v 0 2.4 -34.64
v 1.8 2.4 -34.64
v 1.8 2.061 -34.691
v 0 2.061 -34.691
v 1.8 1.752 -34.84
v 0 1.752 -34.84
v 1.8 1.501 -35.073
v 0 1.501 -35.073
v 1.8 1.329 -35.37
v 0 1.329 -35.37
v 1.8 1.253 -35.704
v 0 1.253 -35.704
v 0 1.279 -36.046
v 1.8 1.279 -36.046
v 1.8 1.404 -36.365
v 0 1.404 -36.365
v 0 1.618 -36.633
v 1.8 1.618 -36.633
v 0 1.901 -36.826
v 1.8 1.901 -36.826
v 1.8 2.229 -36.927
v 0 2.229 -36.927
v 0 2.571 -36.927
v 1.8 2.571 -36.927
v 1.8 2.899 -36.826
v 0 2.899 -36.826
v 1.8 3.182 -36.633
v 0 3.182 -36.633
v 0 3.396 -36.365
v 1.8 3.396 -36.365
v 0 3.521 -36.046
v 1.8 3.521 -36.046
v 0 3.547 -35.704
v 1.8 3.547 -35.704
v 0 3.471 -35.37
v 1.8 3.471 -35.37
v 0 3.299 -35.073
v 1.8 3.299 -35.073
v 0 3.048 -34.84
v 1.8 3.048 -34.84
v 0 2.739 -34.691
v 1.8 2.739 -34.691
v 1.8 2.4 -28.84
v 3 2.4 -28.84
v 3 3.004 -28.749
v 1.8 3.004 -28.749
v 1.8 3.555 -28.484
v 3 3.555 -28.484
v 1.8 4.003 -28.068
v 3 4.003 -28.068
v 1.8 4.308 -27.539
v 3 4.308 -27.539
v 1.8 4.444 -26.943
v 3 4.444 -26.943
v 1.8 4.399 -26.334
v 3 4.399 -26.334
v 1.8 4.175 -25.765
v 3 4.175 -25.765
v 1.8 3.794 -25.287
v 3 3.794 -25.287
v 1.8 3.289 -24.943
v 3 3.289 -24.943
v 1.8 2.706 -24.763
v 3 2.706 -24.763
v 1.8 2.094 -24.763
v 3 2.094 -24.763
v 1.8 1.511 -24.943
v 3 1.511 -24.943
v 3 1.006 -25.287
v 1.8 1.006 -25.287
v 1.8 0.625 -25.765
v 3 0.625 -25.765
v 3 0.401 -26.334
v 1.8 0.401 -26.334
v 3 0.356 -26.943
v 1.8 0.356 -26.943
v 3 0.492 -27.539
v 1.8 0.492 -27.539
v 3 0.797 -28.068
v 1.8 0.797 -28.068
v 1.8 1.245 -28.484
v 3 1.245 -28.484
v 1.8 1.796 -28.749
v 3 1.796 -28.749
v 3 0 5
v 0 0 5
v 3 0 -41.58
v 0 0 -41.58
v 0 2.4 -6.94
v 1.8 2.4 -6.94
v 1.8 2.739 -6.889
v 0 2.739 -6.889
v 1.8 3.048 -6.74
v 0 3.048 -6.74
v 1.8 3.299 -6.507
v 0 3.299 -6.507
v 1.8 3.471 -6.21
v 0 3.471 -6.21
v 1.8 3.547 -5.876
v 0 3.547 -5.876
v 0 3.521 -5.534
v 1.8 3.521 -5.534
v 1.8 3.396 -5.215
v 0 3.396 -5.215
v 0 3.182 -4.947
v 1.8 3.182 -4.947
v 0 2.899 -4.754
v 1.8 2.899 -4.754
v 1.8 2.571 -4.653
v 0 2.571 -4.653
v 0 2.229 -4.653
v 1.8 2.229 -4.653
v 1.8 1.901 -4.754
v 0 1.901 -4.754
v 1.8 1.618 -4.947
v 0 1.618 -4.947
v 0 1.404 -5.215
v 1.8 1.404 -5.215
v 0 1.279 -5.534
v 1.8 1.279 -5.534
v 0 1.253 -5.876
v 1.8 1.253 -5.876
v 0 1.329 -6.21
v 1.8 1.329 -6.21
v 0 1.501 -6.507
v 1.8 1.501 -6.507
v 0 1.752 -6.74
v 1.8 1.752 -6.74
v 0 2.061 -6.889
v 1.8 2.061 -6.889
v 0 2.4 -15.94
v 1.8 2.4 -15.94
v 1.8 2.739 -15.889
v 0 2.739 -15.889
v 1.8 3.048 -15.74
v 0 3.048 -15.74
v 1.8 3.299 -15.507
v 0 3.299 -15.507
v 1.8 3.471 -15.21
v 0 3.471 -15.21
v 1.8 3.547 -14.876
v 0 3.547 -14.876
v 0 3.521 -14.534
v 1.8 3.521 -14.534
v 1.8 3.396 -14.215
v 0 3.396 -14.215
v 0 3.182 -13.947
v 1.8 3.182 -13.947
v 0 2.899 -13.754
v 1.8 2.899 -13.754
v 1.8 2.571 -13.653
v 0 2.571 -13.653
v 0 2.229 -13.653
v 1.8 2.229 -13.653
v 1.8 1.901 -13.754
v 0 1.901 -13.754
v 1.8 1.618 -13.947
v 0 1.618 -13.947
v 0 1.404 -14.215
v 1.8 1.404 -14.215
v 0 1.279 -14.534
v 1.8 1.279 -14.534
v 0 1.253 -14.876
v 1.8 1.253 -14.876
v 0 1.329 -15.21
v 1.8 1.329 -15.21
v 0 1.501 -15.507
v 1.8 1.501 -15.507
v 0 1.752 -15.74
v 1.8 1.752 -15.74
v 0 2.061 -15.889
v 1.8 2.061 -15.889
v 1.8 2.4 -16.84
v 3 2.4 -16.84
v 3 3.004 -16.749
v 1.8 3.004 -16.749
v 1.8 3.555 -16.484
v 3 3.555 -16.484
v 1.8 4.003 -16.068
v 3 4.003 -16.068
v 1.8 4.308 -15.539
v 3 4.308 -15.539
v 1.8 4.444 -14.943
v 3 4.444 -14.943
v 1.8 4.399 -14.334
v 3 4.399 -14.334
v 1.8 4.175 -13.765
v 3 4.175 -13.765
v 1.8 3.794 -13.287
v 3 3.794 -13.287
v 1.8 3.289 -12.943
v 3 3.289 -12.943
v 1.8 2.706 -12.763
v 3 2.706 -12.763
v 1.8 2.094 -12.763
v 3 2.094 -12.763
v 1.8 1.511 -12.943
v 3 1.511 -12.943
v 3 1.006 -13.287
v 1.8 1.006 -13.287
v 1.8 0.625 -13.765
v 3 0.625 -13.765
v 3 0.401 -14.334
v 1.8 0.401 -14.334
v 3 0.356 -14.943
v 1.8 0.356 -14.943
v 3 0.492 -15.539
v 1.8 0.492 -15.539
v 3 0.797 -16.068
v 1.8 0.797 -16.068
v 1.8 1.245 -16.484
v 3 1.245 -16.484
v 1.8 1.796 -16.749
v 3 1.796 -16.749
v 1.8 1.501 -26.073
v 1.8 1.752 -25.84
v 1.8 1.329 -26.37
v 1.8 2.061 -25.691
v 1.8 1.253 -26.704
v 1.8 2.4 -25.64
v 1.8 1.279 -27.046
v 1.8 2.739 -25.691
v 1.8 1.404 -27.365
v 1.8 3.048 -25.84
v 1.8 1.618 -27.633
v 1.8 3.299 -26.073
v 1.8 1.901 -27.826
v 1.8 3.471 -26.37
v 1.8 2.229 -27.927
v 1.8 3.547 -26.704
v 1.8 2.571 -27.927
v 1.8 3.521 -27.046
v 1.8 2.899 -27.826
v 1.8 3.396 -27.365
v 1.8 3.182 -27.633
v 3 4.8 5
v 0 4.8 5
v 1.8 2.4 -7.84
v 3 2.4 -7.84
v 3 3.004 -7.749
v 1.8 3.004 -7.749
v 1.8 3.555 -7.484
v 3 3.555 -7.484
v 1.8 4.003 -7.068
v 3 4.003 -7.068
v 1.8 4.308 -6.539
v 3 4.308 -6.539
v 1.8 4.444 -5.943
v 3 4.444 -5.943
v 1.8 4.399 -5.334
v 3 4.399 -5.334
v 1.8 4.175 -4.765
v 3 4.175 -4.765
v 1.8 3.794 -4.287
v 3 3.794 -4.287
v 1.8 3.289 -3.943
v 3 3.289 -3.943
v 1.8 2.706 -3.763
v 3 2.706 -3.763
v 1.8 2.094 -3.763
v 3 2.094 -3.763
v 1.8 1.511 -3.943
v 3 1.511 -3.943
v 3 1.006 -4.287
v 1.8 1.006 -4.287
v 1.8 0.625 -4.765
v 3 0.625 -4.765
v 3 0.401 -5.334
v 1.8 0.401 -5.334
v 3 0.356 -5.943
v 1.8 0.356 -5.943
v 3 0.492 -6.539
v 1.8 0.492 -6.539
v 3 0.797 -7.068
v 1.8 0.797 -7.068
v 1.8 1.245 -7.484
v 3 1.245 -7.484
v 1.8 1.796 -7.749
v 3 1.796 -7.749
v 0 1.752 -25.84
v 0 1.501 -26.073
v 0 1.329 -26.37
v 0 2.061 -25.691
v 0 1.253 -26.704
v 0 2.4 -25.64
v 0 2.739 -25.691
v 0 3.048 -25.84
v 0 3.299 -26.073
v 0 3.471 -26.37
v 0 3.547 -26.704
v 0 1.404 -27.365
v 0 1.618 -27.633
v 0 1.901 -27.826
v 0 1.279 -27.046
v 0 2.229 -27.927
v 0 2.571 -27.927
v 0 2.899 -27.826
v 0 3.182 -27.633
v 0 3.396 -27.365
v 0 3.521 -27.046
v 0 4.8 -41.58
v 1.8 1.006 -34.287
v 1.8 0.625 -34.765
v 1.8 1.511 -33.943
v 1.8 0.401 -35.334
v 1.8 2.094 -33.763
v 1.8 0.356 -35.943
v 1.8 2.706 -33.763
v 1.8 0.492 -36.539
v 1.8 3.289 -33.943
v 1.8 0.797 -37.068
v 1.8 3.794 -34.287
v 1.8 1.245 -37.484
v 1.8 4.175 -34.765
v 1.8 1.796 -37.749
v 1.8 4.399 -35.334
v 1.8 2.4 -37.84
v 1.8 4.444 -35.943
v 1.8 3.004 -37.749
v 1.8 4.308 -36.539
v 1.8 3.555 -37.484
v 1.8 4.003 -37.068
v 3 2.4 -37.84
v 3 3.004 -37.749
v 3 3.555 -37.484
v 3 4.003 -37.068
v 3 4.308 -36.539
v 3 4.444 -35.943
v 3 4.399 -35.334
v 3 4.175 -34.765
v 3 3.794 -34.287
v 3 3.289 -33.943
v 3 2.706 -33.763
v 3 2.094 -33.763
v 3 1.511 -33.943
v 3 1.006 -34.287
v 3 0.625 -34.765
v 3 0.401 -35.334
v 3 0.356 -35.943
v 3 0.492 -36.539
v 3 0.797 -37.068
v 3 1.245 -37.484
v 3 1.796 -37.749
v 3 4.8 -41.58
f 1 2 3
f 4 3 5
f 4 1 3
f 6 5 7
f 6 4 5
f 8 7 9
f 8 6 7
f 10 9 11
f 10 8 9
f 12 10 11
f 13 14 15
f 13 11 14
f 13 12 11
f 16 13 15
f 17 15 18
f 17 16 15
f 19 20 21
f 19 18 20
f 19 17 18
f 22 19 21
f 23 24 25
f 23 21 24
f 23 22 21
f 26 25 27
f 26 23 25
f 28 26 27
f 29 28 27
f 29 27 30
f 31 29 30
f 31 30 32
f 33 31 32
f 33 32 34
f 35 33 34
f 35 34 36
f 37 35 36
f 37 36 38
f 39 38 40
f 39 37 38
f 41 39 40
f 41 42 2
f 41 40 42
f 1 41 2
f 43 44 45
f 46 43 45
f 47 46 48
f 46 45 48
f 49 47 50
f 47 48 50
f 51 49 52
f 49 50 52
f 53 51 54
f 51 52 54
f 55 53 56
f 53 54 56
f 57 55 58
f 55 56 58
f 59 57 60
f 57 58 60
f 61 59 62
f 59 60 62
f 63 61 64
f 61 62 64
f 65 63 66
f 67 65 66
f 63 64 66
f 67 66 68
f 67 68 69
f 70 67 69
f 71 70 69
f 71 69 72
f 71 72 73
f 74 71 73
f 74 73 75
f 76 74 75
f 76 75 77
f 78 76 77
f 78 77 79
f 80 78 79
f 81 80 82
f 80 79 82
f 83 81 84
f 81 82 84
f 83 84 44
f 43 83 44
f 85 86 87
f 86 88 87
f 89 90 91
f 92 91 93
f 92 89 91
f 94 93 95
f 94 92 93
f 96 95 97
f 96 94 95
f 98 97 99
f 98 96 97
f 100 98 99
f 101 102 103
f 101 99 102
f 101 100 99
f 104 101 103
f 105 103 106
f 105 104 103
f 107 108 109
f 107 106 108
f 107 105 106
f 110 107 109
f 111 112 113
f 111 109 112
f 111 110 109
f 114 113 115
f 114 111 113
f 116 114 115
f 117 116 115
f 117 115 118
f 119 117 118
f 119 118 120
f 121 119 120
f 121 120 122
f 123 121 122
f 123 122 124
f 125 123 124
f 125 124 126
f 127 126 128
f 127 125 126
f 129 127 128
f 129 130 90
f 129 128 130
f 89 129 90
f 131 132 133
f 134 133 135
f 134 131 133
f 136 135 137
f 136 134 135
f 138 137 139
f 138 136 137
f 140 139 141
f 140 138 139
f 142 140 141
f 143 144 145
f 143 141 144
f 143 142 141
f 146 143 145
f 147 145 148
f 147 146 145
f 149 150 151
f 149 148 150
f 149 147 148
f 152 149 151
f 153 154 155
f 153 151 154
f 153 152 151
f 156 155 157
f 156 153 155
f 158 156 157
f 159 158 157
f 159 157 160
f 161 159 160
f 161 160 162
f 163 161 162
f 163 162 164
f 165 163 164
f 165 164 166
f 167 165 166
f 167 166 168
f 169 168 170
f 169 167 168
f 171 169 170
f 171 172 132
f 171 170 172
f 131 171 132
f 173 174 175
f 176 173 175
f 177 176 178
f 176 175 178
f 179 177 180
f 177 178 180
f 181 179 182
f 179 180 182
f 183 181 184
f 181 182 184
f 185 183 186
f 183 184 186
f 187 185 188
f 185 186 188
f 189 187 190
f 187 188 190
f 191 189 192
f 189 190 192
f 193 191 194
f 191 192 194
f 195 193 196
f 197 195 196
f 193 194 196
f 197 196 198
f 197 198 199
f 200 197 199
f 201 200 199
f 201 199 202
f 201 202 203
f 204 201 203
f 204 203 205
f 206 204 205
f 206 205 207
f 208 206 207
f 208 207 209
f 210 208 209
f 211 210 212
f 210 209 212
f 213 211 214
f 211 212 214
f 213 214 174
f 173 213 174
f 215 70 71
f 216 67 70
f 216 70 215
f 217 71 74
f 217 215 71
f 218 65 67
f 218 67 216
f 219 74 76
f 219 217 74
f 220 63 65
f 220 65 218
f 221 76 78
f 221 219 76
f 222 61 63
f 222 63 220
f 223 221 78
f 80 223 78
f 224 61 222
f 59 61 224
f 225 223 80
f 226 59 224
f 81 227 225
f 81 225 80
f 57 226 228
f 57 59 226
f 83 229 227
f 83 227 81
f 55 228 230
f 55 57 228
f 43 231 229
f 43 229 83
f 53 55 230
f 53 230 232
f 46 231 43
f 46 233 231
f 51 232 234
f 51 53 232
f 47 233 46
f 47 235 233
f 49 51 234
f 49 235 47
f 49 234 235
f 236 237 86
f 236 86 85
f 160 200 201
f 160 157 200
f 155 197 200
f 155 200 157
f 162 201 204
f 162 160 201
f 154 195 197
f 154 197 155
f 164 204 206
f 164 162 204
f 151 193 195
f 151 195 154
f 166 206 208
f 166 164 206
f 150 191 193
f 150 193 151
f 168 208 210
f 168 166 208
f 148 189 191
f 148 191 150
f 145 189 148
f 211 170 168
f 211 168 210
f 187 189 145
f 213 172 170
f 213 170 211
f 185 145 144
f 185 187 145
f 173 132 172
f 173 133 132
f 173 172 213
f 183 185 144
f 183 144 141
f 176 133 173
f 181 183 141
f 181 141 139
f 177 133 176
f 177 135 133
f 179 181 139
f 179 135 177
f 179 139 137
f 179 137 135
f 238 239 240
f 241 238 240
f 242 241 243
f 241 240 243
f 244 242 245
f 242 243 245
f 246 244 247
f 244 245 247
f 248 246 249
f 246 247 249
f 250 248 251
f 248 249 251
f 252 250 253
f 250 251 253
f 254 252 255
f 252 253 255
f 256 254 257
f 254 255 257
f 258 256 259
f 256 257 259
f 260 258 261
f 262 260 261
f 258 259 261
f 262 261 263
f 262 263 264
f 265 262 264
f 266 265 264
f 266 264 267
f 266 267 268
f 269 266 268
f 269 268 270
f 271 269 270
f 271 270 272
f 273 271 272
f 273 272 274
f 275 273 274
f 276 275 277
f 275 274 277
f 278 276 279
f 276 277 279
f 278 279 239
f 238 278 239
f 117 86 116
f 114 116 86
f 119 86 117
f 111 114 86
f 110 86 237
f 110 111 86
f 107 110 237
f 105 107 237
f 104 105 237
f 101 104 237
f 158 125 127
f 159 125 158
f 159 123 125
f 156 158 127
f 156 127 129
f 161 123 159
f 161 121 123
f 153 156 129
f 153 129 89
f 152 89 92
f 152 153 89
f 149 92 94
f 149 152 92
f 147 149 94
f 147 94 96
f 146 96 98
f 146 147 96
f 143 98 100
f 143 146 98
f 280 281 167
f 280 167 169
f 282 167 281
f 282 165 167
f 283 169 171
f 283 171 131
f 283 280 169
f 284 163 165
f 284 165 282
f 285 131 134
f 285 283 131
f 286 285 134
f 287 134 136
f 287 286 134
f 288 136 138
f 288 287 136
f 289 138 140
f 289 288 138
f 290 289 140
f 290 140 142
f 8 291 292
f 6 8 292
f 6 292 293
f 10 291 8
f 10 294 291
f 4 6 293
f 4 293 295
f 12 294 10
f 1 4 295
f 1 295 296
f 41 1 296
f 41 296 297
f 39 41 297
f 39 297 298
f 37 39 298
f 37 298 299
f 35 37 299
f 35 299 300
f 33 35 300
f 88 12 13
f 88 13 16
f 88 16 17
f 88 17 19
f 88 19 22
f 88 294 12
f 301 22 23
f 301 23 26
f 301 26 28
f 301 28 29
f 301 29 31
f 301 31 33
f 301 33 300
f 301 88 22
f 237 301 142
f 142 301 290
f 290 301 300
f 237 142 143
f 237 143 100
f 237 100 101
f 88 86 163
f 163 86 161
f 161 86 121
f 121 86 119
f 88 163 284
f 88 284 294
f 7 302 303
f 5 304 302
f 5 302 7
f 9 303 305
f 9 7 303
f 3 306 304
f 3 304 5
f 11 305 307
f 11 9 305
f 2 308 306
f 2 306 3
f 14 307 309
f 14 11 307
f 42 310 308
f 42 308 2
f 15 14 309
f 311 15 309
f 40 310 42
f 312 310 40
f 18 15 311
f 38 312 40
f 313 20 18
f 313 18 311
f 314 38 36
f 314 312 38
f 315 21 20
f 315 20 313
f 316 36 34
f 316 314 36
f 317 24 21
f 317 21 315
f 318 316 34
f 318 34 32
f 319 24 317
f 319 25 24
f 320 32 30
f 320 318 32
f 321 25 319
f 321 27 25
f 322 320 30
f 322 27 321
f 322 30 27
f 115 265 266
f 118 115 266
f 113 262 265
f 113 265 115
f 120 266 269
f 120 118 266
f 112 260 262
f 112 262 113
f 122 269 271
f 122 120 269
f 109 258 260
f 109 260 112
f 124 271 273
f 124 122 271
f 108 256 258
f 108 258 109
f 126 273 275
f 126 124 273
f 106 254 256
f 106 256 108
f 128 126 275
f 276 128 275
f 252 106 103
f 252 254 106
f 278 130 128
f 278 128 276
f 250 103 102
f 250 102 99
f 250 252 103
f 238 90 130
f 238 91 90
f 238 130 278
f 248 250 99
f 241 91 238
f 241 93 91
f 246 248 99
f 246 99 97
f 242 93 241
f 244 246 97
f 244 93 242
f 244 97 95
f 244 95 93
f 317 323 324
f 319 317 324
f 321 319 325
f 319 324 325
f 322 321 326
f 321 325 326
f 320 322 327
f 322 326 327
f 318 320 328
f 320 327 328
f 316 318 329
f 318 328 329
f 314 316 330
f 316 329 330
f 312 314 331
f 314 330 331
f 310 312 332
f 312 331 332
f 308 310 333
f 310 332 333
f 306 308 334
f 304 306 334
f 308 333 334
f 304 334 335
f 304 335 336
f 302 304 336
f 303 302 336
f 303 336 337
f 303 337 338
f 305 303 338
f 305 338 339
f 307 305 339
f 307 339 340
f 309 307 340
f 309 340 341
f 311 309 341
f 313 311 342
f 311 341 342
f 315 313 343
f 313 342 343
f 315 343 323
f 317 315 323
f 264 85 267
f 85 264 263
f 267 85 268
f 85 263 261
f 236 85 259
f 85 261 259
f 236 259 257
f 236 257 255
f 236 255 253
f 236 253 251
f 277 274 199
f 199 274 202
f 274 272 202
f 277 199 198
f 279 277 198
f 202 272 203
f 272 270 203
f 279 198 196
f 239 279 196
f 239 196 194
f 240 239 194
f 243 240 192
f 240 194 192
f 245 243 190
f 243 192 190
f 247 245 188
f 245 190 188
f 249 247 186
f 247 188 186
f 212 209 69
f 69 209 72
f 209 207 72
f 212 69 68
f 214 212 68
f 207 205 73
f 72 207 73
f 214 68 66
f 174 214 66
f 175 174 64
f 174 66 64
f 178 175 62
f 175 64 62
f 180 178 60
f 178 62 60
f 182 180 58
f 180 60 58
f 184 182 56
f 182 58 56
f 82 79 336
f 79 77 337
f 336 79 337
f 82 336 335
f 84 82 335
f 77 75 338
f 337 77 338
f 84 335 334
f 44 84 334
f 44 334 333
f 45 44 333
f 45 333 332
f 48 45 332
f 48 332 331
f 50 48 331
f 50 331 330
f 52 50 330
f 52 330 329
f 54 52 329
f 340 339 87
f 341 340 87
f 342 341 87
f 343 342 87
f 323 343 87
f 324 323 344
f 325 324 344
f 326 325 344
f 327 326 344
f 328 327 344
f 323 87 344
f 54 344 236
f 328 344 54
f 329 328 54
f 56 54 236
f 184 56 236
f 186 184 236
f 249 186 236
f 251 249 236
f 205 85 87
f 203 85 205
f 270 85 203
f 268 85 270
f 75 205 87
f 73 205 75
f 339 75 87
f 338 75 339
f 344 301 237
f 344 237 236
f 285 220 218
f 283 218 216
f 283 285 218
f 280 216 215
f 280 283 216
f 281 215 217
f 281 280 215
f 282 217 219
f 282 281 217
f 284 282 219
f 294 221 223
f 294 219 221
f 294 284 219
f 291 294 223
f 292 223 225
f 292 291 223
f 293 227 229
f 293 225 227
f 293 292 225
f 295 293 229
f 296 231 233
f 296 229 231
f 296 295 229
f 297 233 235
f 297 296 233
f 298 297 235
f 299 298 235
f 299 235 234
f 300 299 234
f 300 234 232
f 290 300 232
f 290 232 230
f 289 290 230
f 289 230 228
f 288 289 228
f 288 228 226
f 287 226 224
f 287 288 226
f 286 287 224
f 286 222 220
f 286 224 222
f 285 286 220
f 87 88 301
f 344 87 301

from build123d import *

# Parameters (mm, degrees)
SKETCH_1_W          = 41.58
SKETCH_1_H          = 4.8
SKETCH_1_R          = 1.15
EXTRUDE_1_DEPTH     = 3
SKETCH_2_R          = 2.05
CUT_EXTRUDE_1_DEPTH = 1.2
SKETCH_3_W          = 3
SKETCH_3_H          = 4.8
EXTRUDE_2_DEPTH     = 5


with BuildPart() as part:
    # 草图1 → 凸台-拉伸1 (new body)
    with BuildSketch(Plane(origin=(0, 0, 0), x_dir=(0, 0, -1), z_dir=(1, 0, 0))):
        with Locations((20.79, 2.4)):
            Rectangle(SKETCH_1_W, SKETCH_1_H)
        with Locations((14.79, 2.4)):
            Circle(SKETCH_1_R, mode=Mode.SUBTRACT)
        with Locations((5.79, 2.4)):
            Circle(SKETCH_1_R, mode=Mode.SUBTRACT)
        with Locations(Location((26.79, 2.4, 0), (0, 0, 180))):
            Circle(SKETCH_1_R, mode=Mode.SUBTRACT)
        with Locations(Location((35.79, 2.4, 0), (0, 0, 180))):
            Circle(SKETCH_1_R, mode=Mode.SUBTRACT)
    extrude(amount=EXTRUDE_1_DEPTH)

    # 草图2 → 切除-拉伸1 (cut)
    with BuildSketch(Plane(origin=(3, 0, 0), x_dir=(0, 0, -1), z_dir=(1, 0, 0))):
        with Locations((5.79, 2.4)):
            Circle(SKETCH_2_R)
        with Locations((14.79, 2.4)):
            Circle(SKETCH_2_R)
        with Locations((26.79, 2.4)):
            Circle(SKETCH_2_R)
        with Locations((35.79, 2.4)):
            Circle(SKETCH_2_R)
    extrude(amount=-CUT_EXTRUDE_1_DEPTH, mode=Mode.SUBTRACT)

    # 草图3 → 凸台-拉伸2 (add)
    with BuildSketch(Plane.XY):
        with Locations((1.5, 2.4)):
            Rectangle(SKETCH_3_W, SKETCH_3_H)
    extrude(amount=EXTRUDE_2_DEPTH)


solid = part.part
